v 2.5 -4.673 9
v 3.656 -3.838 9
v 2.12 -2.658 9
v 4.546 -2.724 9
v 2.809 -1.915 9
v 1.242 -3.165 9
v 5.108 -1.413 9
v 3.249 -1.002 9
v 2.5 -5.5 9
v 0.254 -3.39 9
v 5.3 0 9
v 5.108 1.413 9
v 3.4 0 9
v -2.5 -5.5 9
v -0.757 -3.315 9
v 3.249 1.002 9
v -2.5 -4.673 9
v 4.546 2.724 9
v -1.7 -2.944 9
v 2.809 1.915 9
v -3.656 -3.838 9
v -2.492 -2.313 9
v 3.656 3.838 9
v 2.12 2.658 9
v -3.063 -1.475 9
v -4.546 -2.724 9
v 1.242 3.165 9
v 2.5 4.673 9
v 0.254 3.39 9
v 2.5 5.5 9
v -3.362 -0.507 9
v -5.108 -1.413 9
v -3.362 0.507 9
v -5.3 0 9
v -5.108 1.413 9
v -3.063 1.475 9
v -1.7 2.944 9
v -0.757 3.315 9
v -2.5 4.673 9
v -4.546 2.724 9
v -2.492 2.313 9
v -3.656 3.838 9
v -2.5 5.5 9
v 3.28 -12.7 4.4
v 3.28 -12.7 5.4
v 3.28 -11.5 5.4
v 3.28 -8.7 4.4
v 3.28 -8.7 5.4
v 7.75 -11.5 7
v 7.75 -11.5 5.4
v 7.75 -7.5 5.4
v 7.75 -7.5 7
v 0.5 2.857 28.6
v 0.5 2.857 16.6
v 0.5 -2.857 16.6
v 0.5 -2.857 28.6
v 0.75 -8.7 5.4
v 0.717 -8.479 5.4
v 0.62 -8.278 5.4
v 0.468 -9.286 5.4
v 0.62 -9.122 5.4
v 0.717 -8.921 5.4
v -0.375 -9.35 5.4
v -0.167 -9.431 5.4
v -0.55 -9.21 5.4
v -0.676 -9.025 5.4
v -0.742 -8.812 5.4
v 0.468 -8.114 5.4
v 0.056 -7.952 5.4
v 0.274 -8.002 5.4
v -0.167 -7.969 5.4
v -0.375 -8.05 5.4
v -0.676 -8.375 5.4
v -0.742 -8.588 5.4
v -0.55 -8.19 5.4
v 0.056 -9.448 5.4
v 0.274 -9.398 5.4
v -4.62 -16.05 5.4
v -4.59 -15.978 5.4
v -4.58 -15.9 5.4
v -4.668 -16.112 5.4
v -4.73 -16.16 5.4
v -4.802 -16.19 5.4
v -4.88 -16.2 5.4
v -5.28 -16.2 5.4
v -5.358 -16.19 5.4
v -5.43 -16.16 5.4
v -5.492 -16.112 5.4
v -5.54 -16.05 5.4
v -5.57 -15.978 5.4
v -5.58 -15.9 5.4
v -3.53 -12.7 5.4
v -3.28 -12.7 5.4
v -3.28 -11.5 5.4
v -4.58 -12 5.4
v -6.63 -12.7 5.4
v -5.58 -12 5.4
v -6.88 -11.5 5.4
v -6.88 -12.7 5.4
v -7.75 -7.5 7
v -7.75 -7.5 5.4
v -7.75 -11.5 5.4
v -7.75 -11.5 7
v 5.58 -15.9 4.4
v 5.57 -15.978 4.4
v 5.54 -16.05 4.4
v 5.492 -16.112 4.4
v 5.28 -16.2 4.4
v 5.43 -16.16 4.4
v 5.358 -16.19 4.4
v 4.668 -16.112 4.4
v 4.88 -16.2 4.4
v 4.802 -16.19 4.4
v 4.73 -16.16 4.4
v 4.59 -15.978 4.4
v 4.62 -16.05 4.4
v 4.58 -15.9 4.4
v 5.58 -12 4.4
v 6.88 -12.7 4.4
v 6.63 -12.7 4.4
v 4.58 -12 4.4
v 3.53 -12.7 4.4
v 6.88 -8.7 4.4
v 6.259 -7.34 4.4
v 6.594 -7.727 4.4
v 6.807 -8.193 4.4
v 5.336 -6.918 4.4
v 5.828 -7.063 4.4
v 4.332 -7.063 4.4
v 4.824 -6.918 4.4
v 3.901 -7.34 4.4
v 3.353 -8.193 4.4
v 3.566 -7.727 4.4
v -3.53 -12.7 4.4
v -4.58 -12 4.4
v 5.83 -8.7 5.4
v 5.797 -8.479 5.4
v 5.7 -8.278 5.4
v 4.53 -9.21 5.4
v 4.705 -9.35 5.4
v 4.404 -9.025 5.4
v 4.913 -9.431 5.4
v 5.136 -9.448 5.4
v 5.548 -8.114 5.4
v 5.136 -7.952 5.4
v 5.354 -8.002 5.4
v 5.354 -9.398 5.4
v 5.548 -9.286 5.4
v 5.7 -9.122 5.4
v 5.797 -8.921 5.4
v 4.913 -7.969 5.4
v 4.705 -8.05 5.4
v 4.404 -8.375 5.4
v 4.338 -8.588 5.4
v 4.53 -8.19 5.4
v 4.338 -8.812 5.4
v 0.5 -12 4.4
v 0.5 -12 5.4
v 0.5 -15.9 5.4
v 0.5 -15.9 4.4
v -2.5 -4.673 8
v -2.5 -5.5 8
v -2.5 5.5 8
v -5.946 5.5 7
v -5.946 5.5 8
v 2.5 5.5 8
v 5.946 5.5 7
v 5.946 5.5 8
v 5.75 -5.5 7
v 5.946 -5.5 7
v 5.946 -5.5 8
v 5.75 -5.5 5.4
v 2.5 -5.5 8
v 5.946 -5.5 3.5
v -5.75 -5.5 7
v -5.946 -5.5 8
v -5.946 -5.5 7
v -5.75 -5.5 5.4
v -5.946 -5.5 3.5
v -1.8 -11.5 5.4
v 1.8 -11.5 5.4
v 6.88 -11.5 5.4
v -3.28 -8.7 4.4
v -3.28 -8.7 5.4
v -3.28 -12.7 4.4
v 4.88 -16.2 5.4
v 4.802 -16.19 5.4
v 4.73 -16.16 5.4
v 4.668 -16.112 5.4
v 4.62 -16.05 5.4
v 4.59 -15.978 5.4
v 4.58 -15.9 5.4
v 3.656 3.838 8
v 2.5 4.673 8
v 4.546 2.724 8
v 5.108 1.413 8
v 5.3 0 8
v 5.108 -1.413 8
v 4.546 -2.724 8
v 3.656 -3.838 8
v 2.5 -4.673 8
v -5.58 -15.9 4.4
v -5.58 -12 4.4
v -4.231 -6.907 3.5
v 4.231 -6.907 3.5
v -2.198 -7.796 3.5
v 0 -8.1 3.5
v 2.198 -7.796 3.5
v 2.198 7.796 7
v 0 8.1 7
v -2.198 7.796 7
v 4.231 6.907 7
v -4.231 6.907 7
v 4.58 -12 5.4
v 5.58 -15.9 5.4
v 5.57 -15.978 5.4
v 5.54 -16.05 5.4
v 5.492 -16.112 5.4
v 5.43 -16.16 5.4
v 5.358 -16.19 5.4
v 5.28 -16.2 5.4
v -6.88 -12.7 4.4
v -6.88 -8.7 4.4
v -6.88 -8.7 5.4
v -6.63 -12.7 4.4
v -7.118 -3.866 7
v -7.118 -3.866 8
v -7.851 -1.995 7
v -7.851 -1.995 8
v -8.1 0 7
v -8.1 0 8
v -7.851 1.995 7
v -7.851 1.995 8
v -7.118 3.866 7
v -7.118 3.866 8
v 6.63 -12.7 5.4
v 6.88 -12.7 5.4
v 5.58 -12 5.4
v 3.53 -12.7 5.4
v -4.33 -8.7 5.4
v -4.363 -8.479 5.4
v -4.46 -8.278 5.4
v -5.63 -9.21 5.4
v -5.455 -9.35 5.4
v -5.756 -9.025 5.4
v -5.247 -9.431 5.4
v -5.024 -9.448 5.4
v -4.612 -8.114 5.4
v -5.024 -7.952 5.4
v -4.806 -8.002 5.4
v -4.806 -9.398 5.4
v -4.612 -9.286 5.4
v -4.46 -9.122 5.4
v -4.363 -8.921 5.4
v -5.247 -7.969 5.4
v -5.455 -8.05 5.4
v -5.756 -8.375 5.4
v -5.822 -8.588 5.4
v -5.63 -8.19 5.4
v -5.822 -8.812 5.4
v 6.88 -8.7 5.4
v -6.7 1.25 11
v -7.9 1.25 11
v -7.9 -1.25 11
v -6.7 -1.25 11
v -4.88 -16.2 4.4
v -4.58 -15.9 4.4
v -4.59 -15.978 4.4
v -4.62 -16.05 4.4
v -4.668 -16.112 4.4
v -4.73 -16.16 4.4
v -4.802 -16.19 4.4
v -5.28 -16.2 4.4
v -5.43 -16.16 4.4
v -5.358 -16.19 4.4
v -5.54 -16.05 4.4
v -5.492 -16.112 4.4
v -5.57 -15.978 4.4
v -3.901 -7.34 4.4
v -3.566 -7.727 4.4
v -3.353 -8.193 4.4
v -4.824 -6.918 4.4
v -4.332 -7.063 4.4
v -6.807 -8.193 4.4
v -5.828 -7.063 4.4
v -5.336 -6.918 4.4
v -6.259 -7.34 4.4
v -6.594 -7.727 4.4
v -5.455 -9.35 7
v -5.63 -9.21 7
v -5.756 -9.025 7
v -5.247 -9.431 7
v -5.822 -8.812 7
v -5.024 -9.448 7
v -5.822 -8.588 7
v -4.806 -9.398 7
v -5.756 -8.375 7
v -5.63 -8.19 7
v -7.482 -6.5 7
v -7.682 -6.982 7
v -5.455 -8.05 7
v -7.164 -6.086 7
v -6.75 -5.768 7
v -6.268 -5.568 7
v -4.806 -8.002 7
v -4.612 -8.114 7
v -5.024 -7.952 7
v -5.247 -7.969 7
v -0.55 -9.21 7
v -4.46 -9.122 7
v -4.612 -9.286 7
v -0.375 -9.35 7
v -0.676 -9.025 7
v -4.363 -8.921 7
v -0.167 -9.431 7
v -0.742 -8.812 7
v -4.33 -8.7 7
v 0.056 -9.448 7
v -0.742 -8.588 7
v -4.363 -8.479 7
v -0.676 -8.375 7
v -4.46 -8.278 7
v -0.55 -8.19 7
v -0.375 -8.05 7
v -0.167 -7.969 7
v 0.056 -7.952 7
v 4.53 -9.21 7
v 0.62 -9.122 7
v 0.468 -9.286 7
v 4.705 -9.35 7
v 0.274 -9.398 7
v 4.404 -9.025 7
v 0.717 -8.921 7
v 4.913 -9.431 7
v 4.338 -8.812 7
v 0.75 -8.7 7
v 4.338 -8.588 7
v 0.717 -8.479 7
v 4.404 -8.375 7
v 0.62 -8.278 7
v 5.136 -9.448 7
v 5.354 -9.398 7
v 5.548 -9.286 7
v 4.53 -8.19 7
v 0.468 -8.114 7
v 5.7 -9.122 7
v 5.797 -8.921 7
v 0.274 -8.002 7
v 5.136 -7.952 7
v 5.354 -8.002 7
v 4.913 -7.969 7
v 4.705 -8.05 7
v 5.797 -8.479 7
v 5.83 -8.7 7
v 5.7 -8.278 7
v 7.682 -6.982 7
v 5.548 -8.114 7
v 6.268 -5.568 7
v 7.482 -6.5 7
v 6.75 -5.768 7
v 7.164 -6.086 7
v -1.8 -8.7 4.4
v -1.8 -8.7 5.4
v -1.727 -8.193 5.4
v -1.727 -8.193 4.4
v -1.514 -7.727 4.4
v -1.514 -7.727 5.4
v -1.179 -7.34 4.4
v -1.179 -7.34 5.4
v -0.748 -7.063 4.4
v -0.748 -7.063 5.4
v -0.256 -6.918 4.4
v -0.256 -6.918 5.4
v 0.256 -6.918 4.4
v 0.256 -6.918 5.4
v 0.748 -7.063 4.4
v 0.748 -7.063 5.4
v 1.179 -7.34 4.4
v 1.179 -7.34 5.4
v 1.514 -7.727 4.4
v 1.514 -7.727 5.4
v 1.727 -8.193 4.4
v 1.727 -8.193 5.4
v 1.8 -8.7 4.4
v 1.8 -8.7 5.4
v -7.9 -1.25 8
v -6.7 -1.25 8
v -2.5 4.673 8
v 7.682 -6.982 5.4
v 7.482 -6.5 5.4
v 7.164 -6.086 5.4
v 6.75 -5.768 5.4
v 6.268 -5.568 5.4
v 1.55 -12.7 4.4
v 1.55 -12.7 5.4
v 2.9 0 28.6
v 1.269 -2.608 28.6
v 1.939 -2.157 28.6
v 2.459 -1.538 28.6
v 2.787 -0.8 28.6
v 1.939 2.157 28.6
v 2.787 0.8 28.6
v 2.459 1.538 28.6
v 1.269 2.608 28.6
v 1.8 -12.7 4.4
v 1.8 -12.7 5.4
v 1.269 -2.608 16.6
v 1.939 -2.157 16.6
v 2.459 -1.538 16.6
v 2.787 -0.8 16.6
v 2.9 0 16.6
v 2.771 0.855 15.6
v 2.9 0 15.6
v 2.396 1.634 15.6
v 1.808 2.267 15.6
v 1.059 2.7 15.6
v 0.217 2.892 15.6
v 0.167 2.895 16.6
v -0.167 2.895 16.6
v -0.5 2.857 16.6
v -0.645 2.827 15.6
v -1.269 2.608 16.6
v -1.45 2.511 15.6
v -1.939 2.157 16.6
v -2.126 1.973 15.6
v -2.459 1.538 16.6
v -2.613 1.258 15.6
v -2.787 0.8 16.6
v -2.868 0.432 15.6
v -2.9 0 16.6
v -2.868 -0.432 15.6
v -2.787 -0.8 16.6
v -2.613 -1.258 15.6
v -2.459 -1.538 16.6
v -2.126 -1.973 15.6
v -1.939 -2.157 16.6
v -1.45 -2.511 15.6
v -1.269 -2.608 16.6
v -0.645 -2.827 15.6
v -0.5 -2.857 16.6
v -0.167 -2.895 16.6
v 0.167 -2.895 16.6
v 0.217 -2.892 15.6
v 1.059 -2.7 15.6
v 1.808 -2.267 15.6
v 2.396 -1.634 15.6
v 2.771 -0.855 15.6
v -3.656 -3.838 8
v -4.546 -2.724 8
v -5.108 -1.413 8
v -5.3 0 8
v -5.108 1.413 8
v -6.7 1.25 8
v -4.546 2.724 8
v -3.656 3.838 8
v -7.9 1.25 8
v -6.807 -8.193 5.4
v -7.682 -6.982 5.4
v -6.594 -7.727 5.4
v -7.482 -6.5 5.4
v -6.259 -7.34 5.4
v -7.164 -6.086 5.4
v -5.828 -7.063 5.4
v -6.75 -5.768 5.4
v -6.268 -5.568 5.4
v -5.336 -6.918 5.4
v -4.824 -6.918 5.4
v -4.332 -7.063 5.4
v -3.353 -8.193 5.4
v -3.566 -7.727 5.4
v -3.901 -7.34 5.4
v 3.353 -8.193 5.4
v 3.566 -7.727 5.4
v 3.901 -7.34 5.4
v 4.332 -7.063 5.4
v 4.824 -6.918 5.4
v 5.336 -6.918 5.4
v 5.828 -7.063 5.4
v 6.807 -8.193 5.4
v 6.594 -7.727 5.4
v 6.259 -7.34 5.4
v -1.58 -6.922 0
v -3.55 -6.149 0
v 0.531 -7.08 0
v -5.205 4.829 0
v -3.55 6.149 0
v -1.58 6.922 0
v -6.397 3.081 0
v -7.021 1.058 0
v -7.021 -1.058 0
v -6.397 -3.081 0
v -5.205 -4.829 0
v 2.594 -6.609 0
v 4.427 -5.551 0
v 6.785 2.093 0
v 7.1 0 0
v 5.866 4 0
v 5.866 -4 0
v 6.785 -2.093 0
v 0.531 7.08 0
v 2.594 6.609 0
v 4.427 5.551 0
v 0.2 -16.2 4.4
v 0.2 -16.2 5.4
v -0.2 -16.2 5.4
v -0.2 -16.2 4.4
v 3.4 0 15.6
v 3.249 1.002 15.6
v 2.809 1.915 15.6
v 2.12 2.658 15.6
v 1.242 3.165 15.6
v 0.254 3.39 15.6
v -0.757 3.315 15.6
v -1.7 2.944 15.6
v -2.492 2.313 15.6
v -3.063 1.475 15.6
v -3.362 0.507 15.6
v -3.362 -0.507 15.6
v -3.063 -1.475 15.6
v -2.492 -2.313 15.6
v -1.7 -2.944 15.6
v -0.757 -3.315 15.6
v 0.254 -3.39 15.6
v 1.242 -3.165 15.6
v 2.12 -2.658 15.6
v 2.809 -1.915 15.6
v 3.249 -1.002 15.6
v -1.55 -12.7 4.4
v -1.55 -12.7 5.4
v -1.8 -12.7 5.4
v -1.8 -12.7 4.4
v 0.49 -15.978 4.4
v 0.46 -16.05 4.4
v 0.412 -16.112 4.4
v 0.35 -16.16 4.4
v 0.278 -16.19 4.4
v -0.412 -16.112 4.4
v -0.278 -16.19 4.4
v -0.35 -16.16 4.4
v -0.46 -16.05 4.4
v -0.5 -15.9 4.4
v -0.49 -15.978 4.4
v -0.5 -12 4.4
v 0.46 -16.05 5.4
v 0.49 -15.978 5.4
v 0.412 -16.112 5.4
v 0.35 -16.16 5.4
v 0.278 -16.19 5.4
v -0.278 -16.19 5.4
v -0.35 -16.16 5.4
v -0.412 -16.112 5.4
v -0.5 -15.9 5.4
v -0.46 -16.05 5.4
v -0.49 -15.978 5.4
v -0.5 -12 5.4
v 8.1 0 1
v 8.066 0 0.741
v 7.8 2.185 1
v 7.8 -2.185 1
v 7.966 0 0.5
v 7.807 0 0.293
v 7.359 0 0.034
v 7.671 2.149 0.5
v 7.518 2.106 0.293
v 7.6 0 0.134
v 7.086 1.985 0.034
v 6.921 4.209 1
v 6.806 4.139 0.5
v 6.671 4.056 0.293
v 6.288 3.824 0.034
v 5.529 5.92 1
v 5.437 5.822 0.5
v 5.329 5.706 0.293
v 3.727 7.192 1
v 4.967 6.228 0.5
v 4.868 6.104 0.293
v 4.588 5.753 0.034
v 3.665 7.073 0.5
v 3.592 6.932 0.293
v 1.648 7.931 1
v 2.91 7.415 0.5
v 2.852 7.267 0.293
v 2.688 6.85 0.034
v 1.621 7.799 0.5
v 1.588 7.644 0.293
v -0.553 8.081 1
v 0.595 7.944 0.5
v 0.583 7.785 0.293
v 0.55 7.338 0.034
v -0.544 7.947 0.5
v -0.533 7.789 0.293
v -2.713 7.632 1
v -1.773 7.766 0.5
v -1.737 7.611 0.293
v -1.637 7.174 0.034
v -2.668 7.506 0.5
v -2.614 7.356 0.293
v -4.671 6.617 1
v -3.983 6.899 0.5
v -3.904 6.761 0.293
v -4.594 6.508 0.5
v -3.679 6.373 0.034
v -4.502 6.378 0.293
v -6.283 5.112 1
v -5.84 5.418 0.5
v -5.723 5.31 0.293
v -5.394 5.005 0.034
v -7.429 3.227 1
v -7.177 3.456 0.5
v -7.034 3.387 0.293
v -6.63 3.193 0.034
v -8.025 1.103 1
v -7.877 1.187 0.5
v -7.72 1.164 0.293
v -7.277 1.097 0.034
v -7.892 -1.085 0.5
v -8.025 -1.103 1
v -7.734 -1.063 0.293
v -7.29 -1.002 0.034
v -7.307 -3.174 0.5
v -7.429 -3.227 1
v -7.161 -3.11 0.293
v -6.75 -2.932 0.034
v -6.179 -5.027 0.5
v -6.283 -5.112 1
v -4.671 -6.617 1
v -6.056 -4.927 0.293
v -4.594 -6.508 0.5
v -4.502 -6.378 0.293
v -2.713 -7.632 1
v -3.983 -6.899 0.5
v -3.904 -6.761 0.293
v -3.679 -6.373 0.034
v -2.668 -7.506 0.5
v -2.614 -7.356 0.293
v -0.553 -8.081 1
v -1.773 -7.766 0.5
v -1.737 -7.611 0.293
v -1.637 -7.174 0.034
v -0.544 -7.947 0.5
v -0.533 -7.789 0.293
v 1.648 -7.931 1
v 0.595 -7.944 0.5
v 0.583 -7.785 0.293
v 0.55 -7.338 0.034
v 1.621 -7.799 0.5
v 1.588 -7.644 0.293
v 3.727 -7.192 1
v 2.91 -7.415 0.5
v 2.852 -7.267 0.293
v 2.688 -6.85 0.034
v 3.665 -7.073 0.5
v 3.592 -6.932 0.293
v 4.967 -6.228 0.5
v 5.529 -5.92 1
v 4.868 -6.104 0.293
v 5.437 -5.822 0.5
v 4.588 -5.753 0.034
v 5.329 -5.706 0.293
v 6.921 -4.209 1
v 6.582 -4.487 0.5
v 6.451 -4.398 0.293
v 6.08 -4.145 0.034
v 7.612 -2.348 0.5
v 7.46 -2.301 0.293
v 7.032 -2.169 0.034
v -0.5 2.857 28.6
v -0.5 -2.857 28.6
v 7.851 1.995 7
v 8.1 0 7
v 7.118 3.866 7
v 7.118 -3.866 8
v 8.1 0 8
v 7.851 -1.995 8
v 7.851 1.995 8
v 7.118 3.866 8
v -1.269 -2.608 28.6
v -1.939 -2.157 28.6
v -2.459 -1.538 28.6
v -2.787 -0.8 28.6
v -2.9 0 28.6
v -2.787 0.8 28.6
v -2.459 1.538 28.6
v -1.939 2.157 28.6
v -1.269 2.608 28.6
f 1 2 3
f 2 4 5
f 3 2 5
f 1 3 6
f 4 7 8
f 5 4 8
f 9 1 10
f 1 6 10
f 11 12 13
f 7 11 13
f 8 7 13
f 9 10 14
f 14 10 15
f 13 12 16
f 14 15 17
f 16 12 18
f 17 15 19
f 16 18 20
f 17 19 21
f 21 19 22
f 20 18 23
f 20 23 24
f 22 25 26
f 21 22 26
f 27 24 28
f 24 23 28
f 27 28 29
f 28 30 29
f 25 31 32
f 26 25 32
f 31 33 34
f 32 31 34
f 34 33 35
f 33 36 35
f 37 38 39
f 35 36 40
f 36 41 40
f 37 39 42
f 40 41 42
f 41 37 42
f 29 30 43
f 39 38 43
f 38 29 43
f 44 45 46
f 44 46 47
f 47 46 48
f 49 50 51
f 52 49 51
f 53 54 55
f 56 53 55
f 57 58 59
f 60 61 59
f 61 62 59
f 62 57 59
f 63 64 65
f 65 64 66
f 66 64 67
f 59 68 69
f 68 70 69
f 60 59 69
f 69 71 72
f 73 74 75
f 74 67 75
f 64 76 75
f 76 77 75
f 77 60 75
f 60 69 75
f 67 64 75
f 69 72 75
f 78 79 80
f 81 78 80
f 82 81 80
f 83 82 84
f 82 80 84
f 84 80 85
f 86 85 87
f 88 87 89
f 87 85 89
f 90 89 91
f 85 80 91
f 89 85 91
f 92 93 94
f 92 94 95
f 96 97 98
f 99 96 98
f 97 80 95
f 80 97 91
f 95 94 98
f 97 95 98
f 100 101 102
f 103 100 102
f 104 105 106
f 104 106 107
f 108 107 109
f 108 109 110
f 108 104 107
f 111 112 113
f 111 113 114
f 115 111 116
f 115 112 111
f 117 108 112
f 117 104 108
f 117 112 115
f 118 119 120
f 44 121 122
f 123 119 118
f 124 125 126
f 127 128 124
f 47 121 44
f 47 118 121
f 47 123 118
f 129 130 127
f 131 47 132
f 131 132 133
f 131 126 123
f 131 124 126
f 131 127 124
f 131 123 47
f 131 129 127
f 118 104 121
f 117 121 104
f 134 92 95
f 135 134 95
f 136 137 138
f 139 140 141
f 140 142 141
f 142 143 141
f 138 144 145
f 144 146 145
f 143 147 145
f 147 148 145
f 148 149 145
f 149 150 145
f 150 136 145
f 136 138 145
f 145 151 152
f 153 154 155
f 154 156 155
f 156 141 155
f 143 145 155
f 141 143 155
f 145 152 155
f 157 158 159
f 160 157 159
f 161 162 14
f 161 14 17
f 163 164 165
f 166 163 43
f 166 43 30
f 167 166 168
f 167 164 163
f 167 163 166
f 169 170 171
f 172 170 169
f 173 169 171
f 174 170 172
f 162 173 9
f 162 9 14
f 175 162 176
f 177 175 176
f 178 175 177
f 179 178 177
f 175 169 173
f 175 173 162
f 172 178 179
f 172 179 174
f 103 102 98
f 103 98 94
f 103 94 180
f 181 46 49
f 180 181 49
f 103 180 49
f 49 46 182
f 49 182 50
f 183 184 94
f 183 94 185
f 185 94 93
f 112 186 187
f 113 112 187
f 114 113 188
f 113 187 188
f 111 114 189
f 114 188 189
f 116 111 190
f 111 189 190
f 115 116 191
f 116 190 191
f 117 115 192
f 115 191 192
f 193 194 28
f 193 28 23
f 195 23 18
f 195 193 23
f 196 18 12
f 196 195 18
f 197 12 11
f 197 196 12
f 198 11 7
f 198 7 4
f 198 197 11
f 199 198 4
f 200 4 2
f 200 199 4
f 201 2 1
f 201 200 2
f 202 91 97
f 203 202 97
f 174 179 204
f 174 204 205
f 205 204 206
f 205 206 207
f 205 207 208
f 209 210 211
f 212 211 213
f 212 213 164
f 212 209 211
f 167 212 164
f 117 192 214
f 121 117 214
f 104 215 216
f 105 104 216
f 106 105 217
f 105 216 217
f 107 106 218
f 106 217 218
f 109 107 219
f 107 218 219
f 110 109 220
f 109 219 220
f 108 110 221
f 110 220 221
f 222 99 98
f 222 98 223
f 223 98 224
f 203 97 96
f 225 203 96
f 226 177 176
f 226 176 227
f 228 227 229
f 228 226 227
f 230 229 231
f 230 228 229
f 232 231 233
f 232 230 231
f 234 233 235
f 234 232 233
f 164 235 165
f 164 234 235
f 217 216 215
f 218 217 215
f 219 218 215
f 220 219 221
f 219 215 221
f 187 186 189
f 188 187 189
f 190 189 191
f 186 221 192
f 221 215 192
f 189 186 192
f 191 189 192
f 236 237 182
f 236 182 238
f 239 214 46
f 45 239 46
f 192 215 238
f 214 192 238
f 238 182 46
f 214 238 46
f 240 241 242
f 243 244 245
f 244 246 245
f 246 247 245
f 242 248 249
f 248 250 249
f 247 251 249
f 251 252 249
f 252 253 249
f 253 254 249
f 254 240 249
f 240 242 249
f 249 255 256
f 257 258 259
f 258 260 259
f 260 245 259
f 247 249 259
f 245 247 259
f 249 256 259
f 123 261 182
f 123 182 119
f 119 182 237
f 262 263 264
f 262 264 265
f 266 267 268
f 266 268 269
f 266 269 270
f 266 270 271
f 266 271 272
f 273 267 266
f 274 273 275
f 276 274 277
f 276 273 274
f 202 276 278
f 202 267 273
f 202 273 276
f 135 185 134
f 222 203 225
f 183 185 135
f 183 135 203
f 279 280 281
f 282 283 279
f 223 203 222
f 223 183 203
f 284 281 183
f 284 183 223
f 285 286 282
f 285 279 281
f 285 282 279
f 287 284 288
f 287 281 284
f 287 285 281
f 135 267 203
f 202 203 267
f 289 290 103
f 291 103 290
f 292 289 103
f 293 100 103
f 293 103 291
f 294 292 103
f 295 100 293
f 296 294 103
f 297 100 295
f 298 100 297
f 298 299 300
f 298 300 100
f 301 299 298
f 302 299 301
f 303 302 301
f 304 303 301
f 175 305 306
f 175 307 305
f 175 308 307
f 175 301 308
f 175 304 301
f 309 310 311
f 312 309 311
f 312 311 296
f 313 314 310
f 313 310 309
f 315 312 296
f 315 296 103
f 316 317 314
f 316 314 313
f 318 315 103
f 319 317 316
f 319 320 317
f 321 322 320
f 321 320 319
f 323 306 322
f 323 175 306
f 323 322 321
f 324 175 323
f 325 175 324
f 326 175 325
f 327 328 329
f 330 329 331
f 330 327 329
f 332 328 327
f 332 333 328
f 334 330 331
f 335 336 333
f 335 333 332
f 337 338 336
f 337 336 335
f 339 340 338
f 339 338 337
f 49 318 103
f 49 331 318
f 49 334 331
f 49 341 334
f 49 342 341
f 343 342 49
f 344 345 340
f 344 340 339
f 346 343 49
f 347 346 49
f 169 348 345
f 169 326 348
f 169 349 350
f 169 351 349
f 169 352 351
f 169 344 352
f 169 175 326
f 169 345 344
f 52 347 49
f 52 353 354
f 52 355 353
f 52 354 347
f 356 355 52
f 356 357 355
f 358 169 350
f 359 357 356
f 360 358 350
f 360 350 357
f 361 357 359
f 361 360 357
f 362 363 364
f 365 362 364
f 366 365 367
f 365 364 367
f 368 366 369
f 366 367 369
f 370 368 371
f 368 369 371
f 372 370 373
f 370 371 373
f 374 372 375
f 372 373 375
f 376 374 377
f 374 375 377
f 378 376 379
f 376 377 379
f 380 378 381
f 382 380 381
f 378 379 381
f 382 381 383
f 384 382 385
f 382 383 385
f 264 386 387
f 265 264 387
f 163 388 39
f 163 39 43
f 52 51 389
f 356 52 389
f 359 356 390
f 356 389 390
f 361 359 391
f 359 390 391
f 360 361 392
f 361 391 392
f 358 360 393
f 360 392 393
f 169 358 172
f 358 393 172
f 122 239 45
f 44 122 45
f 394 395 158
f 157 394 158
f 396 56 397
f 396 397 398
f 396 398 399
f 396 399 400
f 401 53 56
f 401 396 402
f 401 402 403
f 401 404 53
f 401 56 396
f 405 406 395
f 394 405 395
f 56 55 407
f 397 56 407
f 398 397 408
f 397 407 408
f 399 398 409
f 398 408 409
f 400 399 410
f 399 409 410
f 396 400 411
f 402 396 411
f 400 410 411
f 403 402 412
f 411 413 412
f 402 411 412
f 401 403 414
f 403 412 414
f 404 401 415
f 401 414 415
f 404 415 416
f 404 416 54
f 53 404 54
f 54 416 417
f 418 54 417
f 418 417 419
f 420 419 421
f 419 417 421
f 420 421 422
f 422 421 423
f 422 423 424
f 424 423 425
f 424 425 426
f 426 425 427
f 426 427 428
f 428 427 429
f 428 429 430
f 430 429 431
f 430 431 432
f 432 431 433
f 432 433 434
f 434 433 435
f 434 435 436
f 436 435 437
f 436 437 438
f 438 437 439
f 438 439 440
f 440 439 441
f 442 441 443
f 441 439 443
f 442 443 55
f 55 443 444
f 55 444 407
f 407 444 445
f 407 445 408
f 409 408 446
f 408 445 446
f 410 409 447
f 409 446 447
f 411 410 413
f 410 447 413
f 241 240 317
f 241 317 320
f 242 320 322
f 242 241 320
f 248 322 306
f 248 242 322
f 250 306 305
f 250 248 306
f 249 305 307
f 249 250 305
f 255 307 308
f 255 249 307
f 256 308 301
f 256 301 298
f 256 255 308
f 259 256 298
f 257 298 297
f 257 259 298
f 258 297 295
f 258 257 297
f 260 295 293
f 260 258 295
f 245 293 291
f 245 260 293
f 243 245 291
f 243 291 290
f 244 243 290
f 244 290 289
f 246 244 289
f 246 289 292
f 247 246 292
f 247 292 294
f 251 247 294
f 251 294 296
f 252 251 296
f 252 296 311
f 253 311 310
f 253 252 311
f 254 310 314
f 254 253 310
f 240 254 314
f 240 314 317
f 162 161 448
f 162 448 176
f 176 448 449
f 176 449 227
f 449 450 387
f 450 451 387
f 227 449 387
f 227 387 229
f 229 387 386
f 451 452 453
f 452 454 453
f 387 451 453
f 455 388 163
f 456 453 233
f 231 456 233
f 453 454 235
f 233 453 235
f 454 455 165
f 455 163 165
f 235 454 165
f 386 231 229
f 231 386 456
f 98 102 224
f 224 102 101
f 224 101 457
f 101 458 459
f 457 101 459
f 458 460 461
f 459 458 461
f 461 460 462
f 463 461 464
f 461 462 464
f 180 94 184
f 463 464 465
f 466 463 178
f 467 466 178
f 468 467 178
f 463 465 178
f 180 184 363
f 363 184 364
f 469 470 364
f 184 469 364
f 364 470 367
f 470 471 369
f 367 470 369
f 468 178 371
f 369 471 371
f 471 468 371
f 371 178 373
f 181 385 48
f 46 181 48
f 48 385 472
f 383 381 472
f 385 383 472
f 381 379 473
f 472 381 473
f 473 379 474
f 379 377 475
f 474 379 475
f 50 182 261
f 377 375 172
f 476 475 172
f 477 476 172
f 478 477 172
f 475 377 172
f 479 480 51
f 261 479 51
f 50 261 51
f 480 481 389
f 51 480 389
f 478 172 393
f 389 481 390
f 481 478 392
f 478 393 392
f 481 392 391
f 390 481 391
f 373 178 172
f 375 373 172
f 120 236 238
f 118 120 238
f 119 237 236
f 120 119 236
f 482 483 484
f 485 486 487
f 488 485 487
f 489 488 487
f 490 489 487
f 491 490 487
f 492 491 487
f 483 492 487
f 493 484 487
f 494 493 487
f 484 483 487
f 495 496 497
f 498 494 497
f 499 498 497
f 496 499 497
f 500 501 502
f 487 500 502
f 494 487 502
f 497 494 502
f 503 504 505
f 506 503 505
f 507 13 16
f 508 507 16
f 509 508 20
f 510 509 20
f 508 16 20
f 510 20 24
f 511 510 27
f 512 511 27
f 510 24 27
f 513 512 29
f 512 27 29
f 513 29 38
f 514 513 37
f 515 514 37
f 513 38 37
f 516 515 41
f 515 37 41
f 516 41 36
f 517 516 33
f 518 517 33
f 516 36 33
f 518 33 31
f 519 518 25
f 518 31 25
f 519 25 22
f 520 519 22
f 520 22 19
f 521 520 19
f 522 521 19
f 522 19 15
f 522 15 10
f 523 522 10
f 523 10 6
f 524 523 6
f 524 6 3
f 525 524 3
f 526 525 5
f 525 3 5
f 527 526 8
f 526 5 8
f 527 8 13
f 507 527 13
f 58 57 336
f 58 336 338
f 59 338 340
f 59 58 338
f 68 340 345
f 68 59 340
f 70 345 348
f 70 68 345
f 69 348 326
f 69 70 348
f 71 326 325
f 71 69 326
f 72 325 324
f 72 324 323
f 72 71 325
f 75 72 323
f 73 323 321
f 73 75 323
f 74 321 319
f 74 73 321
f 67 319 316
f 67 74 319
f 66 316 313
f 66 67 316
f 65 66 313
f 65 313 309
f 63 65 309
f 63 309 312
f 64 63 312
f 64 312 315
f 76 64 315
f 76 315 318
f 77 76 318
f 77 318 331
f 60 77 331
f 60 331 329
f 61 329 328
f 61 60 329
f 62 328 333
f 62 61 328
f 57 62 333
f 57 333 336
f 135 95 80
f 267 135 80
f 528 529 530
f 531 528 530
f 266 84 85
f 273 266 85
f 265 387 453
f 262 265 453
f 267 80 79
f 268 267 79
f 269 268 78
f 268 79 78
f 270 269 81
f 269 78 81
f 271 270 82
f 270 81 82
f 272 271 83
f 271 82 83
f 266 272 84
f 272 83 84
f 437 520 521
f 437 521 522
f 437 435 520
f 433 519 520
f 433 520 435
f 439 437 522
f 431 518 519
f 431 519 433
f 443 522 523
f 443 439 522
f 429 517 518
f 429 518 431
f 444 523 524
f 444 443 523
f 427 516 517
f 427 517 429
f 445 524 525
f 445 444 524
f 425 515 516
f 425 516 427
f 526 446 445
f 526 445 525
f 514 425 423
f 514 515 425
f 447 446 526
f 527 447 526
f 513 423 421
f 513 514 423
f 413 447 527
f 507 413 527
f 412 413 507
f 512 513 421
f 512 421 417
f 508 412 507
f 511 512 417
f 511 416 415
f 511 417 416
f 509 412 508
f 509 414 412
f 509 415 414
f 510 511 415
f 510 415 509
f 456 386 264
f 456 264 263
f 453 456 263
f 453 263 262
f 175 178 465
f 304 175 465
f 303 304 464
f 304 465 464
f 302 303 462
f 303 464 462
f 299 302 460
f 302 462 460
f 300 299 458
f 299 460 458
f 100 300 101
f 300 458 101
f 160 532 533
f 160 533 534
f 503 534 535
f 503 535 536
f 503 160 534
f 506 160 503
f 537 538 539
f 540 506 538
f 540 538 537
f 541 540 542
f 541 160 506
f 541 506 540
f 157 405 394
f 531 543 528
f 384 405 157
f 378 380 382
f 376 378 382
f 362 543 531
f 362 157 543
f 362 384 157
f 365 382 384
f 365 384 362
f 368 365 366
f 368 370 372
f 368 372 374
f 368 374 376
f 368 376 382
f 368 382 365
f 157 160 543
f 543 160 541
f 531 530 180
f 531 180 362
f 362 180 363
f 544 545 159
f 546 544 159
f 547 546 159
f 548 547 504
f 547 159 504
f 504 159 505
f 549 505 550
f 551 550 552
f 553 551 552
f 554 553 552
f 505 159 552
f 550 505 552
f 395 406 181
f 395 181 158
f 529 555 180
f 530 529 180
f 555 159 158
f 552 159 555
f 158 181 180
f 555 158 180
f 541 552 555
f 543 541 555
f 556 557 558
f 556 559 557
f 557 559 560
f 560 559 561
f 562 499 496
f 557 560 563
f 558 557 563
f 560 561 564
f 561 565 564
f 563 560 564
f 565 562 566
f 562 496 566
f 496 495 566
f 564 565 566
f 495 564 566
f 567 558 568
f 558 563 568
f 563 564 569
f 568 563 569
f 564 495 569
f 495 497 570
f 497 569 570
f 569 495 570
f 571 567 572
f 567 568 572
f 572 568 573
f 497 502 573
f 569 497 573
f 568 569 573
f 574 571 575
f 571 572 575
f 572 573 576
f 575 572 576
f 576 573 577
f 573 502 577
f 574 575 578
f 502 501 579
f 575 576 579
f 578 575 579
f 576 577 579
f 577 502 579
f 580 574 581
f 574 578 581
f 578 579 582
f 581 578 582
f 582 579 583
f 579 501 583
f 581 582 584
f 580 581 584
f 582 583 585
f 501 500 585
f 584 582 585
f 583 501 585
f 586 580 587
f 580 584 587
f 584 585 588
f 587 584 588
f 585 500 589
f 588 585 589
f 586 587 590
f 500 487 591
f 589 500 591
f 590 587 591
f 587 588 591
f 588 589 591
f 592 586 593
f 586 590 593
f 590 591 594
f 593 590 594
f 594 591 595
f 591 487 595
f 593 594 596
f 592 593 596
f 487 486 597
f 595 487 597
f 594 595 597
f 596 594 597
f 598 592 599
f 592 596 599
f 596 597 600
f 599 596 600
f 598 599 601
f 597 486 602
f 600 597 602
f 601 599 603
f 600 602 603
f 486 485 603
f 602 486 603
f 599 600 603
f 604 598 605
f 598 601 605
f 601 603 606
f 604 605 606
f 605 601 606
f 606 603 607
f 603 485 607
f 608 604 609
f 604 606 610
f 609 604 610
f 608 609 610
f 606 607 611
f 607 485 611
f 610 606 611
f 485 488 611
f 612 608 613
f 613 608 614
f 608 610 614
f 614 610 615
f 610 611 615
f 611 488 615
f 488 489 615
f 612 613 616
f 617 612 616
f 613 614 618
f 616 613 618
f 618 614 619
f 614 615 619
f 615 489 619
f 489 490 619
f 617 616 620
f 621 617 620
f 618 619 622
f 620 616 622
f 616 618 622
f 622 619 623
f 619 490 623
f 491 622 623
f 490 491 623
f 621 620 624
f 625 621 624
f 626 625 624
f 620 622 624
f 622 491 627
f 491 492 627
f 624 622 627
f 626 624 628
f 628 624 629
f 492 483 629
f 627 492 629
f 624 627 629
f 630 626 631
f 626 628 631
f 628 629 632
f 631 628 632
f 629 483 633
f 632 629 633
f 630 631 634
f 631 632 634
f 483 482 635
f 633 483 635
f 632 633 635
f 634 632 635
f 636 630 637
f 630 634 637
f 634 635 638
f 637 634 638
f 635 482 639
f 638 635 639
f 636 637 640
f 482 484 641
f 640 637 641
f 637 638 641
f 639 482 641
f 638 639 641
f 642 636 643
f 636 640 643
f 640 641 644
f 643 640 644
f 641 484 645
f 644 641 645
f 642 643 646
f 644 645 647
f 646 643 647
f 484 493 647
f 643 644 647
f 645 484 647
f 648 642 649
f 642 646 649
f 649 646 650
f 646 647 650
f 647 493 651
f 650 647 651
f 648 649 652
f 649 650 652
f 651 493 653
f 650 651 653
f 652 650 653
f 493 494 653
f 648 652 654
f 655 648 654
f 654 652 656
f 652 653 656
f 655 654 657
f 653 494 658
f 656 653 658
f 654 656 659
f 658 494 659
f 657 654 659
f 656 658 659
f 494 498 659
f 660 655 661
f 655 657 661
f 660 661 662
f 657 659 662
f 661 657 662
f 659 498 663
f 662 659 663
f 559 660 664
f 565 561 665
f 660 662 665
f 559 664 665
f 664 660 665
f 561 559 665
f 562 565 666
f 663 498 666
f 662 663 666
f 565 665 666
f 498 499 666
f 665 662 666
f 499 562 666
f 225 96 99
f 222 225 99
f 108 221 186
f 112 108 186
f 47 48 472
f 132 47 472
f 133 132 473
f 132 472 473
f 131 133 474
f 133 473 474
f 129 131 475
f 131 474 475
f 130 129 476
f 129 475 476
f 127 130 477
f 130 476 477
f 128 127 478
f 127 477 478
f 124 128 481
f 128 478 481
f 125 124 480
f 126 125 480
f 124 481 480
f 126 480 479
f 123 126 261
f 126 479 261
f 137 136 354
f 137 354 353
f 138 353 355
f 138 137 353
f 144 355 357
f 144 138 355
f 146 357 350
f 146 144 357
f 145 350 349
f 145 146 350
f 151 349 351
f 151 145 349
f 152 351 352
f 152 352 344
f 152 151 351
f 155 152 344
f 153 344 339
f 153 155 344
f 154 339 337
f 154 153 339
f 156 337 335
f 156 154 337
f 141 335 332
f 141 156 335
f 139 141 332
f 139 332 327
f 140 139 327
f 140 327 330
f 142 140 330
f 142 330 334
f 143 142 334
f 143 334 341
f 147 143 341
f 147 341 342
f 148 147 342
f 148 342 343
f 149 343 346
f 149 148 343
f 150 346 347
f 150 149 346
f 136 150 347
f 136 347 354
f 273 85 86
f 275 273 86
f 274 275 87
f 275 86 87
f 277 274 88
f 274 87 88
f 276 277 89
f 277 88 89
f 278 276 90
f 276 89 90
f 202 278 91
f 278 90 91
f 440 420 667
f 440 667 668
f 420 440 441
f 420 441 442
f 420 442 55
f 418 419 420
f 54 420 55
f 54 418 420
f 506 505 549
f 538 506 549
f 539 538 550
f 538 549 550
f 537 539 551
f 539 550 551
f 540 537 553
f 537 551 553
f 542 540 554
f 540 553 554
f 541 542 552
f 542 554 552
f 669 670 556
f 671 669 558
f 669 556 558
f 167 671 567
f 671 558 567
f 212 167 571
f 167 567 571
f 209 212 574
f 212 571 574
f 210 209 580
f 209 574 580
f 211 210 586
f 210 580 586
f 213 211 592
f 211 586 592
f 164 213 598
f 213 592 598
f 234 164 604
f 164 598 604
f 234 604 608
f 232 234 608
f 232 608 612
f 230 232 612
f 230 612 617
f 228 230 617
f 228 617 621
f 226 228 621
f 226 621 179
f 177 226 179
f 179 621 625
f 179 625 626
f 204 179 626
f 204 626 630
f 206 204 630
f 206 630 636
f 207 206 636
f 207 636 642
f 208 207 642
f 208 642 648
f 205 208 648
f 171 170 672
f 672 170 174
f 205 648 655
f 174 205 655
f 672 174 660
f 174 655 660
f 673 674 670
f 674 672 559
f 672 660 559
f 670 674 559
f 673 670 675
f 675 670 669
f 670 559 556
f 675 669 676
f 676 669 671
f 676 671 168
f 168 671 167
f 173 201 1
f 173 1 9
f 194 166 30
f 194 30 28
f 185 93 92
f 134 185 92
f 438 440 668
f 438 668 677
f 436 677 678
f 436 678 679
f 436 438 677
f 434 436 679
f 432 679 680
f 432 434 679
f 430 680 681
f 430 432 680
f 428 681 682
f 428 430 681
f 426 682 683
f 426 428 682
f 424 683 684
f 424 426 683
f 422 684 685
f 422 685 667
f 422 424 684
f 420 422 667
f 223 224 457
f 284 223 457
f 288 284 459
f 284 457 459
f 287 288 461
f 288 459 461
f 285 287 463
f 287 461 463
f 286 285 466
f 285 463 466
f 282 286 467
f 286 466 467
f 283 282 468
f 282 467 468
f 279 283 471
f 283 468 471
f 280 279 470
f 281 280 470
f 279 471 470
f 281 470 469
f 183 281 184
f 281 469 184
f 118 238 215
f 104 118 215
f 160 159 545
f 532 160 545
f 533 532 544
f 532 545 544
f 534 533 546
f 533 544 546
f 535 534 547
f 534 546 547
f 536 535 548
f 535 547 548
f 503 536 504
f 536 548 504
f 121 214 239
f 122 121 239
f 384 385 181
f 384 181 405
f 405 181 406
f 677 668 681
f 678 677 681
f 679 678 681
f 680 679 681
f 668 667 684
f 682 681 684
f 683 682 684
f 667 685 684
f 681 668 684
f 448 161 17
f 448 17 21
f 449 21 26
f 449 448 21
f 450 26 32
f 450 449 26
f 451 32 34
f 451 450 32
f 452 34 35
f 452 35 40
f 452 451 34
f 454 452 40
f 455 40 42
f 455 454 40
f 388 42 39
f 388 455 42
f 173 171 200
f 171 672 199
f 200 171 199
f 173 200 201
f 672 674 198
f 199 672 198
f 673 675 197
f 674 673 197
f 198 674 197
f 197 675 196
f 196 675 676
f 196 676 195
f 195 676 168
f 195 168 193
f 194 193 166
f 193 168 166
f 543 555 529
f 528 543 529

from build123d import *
from build123d.topology import SkipClean

# Parameters (mm, degrees)
IZIM1_R                     = 8.1
Y_KSEKLIK_EKSTR_ZYON1_DEPTH = 7
RADYUS1_R                   = 1
Y_KSEKLIK_EKSTR_ZYON2_DEPTH = 1
Y_KSEKLIK_EKSTR_ZYON3_DEPTH = 1
IZIM4_W                     = 1.2
IZIM4_H                     = 2.5
Y_KSEKLIK_EKSTR_ZYON4_DEPTH = 3
IZIM5_R                     = 3.4
Y_KSEKLIK_EKSTR_ZYON5_DEPTH = 6.6
IZIM6_R                     = 2.9
Y_KSEKLIK_EKSTR_ZYON6_DEPTH = 1
Y_KSEKLIK_EKSTR_ZYON7_DEPTH = 12
IZIM8_W                     = 13.702328024
IZIM8_H                     = 4.535329086
KES_EKSTR_ZYON1_DEPTH       = 3.5
Y_KSEKLIK_EKSTR_ZYON8_START = 1.9
IZIM9_R                     = 0.75
Y_KSEKLIK_EKSTR_ZYON8_DEPTH = 1.6
Y_KSEKLIK_EKSTR_ZYON9_DEPTH = 1


with BuildPart() as part:
    # Çizim1 → Yükseklik-Ekstrüzyon1 (new body)
    with BuildSketch(Plane.XY):
        Circle(IZIM1_R)
    extrude(amount=Y_KSEKLIK_EKSTR_ZYON1_DEPTH)

    # Radyus1
    radyus1_edges = [part.edges().sort_by_distance(p)[0] for p in [
        (-8.1, 0, 0),
    ]]
    fillet(radyus1_edges, radius=RADYUS1_R)

    # Çizim2 → Yükseklik-Ekstrüzyon2 (add)
    with SkipClean():  # the faces are left unmerged after this step: merging them gives an invalid solid
        with BuildSketch(Plane.XY.offset(7)):
            with BuildLine():
                Line((-5.946427499, 5.5), (5.946427499, 5.5))
                ThreePointArc((5.946427499, 5.5), (8.1, 0), (5.946427499, -5.5))
                Line((5.946427499, -5.5), (-5.946427499, -5.5))
                ThreePointArc((-5.946427499, -5.5), (-8.1, 0), (-5.946427499, 5.5))
            make_face()
        extrude(amount=Y_KSEKLIK_EKSTR_ZYON2_DEPTH)

    # Çizim3 → Yükseklik-Ekstrüzyon3 (add)
    with BuildSketch(Plane.XY.offset(8)):
        with BuildLine():
            Line((-2.5, 5.5), (2.5, 5.5))
            Line((2.5, 5.5), (2.5, 4.673328578))
            ThreePointArc((2.5, 4.673328578), (5.3, 0), (2.5, -4.673328578))
            Line((2.5, -4.673328578), (2.5, -5.5))
            Line((2.5, -5.5), (-2.5, -5.5))
            Line((-2.5, -5.5), (-2.5, -4.673328578))
            ThreePointArc((-2.5, -4.673328578), (-5.3, 0), (-2.5, 4.673328578))
            Line((-2.5, 4.673328578), (-2.5, 5.5))
        make_face()
    extrude(amount=Y_KSEKLIK_EKSTR_ZYON3_DEPTH)

    # Çizim4 → Yükseklik-Ekstrüzyon4 (add)
    with BuildSketch(Plane.XY.offset(8)):
        with Locations((-7.3, 0)):
            Rectangle(IZIM4_W, IZIM4_H)
    extrude(amount=Y_KSEKLIK_EKSTR_ZYON4_DEPTH)

    # Çizim5 → Yükseklik-Ekstrüzyon5 (add)
    with BuildSketch(Plane.XY.offset(9)):
        Circle(IZIM5_R)
    extrude(amount=Y_KSEKLIK_EKSTR_ZYON5_DEPTH)

    # Çizim6 → Yükseklik-Ekstrüzyon6 (add)
    with BuildSketch(Plane.XY.offset(15.6)):
        Circle(IZIM6_R)
    extrude(amount=Y_KSEKLIK_EKSTR_ZYON6_DEPTH)

    # Çizim7 → Yükseklik-Ekstrüzyon7 (add)
    with SkipClean():  # the faces are left unmerged after this step: merging them gives an invalid solid
        with BuildSketch(Plane.XY.offset(16.6)):
            with BuildLine():
                Line((-0.5, 2.856571371), (-0.5, -2.856571371))
                ThreePointArc((-0.5, -2.856571371), (-2.9, 0), (-0.5, 2.856571371))
            make_face()
            with BuildLine():
                Line((0.5, 2.856571371), (0.5, -2.856571371))
                ThreePointArc((0.5, -2.856571371), (2.9, 0), (0.5, 2.856571371))
            make_face()
        extrude(amount=Y_KSEKLIK_EKSTR_ZYON7_DEPTH)

    # Çizim8 → Kes-Ekstrüzyon1 (cut)
    with BuildSketch(Plane.XY.offset(7)):
        with Locations((0.904736513, -7.767664543)):
            Rectangle(IZIM8_W, IZIM8_H)
    extrude(amount=-KES_EKSTR_ZYON1_DEPTH, mode=Mode.SUBTRACT)

    # Çizim9 → Yükseklik-Ekstrüzyon8 (add)
    with BuildSketch(Plane.XY.offset(3.5).offset(Y_KSEKLIK_EKSTR_ZYON8_START)):
        with BuildLine():
            Line((-7.75, -11.5), (7.75, -11.5))
            Line((7.75, -11.5), (7.75, -7.5))
            ThreePointArc((7.75, -7.5), (7.164213562, -6.085786438), (5.75, -5.5))
            Line((5.75, -5.5), (-5.75, -5.5))
            ThreePointArc((-5.75, -5.5), (-7.164213562, -6.085786438), (-7.75, -7.5))
            Line((-7.75, -7.5), (-7.75, -11.5))
        make_face()
        with Locations((0, -8.7)):
            Circle(IZIM9_R, mode=Mode.SUBTRACT)
        with Locations((5.08, -8.7)):
            Circle(IZIM9_R, mode=Mode.SUBTRACT)
        with Locations((-5.08, -8.7)):
            Circle(IZIM9_R, mode=Mode.SUBTRACT)
    extrude(amount=Y_KSEKLIK_EKSTR_ZYON8_DEPTH)

    # Çizim10 → Yükseklik-Ekstrüzyon9 (add)
    with BuildSketch(Plane(origin=(0, 0, 5.4), x_dir=(-1, 0, 0), z_dir=(0, 0, -1))):
        with BuildLine():
            Line((3.53, -12.7), (4.58, -12))
            Line((4.58, -12), (4.58, -15.9))
            ThreePointArc((4.58, -15.9), (4.667867966, -16.112132034), (4.88, -16.2))
            Line((4.88, -16.2), (5.28, -16.2))
            ThreePointArc((5.28, -16.2), (5.492132034, -16.112132034), (5.58, -15.9))
            Line((5.58, -15.9), (5.58, -12))
            Line((5.58, -12), (6.63, -12.7))
            Line((6.63, -12.7), (6.88, -12.7))
            Line((6.88, -12.7), (6.88, -8.7))
            ThreePointArc((6.88, -8.7), (5.08, -6.9), (3.28, -8.7))
            Line((3.28, -8.7), (3.28, -12.7))
            Line((3.28, -12.7), (3.53, -12.7))
        make_face()
        with BuildLine():
            Line((-1.55, -12.7), (-0.5, -12))
            Line((-0.5, -12), (-0.5, -15.9))
            ThreePointArc((-0.5, -15.9), (-0.412132034, -16.112132034), (-0.2, -16.2))
            Line((-0.2, -16.2), (0.2, -16.2))
            ThreePointArc((0.2, -16.2), (0.412132034, -16.112132034), (0.5, -15.9))
            Line((0.5, -15.9), (0.5, -12))
            Line((0.5, -12), (1.55, -12.7))
            Line((1.55, -12.7), (1.8, -12.7))
            Line((1.8, -12.7), (1.8, -8.7))
            ThreePointArc((1.8, -8.7), (0, -6.9), (-1.8, -8.7))
            Line((-1.8, -8.7), (-1.8, -12.7))
            Line((-1.8, -12.7), (-1.55, -12.7))
        make_face()
        with BuildLine():
            Line((-6.63, -12.7), (-5.58, -12))
            Line((-5.58, -12), (-5.58, -15.9))
            ThreePointArc((-5.58, -15.9), (-5.492132034, -16.112132034), (-5.28, -16.2))
            Line((-5.28, -16.2), (-4.88, -16.2))
            ThreePointArc((-4.88, -16.2), (-4.667867966, -16.112132034), (-4.58, -15.9))
            Line((-4.58, -15.9), (-4.58, -12))
            Line((-4.58, -12), (-3.53, -12.7))
            Line((-3.53, -12.7), (-3.28, -12.7))
            Line((-3.28, -12.7), (-3.28, -8.7))
            ThreePointArc((-3.28, -8.7), (-5.08, -6.9), (-6.88, -8.7))
            Line((-6.88, -8.7), (-6.88, -12.7))
            Line((-6.88, -12.7), (-6.63, -12.7))
        make_face()
    extrude(amount=Y_KSEKLIK_EKSTR_ZYON9_DEPTH)


solid = part.part
